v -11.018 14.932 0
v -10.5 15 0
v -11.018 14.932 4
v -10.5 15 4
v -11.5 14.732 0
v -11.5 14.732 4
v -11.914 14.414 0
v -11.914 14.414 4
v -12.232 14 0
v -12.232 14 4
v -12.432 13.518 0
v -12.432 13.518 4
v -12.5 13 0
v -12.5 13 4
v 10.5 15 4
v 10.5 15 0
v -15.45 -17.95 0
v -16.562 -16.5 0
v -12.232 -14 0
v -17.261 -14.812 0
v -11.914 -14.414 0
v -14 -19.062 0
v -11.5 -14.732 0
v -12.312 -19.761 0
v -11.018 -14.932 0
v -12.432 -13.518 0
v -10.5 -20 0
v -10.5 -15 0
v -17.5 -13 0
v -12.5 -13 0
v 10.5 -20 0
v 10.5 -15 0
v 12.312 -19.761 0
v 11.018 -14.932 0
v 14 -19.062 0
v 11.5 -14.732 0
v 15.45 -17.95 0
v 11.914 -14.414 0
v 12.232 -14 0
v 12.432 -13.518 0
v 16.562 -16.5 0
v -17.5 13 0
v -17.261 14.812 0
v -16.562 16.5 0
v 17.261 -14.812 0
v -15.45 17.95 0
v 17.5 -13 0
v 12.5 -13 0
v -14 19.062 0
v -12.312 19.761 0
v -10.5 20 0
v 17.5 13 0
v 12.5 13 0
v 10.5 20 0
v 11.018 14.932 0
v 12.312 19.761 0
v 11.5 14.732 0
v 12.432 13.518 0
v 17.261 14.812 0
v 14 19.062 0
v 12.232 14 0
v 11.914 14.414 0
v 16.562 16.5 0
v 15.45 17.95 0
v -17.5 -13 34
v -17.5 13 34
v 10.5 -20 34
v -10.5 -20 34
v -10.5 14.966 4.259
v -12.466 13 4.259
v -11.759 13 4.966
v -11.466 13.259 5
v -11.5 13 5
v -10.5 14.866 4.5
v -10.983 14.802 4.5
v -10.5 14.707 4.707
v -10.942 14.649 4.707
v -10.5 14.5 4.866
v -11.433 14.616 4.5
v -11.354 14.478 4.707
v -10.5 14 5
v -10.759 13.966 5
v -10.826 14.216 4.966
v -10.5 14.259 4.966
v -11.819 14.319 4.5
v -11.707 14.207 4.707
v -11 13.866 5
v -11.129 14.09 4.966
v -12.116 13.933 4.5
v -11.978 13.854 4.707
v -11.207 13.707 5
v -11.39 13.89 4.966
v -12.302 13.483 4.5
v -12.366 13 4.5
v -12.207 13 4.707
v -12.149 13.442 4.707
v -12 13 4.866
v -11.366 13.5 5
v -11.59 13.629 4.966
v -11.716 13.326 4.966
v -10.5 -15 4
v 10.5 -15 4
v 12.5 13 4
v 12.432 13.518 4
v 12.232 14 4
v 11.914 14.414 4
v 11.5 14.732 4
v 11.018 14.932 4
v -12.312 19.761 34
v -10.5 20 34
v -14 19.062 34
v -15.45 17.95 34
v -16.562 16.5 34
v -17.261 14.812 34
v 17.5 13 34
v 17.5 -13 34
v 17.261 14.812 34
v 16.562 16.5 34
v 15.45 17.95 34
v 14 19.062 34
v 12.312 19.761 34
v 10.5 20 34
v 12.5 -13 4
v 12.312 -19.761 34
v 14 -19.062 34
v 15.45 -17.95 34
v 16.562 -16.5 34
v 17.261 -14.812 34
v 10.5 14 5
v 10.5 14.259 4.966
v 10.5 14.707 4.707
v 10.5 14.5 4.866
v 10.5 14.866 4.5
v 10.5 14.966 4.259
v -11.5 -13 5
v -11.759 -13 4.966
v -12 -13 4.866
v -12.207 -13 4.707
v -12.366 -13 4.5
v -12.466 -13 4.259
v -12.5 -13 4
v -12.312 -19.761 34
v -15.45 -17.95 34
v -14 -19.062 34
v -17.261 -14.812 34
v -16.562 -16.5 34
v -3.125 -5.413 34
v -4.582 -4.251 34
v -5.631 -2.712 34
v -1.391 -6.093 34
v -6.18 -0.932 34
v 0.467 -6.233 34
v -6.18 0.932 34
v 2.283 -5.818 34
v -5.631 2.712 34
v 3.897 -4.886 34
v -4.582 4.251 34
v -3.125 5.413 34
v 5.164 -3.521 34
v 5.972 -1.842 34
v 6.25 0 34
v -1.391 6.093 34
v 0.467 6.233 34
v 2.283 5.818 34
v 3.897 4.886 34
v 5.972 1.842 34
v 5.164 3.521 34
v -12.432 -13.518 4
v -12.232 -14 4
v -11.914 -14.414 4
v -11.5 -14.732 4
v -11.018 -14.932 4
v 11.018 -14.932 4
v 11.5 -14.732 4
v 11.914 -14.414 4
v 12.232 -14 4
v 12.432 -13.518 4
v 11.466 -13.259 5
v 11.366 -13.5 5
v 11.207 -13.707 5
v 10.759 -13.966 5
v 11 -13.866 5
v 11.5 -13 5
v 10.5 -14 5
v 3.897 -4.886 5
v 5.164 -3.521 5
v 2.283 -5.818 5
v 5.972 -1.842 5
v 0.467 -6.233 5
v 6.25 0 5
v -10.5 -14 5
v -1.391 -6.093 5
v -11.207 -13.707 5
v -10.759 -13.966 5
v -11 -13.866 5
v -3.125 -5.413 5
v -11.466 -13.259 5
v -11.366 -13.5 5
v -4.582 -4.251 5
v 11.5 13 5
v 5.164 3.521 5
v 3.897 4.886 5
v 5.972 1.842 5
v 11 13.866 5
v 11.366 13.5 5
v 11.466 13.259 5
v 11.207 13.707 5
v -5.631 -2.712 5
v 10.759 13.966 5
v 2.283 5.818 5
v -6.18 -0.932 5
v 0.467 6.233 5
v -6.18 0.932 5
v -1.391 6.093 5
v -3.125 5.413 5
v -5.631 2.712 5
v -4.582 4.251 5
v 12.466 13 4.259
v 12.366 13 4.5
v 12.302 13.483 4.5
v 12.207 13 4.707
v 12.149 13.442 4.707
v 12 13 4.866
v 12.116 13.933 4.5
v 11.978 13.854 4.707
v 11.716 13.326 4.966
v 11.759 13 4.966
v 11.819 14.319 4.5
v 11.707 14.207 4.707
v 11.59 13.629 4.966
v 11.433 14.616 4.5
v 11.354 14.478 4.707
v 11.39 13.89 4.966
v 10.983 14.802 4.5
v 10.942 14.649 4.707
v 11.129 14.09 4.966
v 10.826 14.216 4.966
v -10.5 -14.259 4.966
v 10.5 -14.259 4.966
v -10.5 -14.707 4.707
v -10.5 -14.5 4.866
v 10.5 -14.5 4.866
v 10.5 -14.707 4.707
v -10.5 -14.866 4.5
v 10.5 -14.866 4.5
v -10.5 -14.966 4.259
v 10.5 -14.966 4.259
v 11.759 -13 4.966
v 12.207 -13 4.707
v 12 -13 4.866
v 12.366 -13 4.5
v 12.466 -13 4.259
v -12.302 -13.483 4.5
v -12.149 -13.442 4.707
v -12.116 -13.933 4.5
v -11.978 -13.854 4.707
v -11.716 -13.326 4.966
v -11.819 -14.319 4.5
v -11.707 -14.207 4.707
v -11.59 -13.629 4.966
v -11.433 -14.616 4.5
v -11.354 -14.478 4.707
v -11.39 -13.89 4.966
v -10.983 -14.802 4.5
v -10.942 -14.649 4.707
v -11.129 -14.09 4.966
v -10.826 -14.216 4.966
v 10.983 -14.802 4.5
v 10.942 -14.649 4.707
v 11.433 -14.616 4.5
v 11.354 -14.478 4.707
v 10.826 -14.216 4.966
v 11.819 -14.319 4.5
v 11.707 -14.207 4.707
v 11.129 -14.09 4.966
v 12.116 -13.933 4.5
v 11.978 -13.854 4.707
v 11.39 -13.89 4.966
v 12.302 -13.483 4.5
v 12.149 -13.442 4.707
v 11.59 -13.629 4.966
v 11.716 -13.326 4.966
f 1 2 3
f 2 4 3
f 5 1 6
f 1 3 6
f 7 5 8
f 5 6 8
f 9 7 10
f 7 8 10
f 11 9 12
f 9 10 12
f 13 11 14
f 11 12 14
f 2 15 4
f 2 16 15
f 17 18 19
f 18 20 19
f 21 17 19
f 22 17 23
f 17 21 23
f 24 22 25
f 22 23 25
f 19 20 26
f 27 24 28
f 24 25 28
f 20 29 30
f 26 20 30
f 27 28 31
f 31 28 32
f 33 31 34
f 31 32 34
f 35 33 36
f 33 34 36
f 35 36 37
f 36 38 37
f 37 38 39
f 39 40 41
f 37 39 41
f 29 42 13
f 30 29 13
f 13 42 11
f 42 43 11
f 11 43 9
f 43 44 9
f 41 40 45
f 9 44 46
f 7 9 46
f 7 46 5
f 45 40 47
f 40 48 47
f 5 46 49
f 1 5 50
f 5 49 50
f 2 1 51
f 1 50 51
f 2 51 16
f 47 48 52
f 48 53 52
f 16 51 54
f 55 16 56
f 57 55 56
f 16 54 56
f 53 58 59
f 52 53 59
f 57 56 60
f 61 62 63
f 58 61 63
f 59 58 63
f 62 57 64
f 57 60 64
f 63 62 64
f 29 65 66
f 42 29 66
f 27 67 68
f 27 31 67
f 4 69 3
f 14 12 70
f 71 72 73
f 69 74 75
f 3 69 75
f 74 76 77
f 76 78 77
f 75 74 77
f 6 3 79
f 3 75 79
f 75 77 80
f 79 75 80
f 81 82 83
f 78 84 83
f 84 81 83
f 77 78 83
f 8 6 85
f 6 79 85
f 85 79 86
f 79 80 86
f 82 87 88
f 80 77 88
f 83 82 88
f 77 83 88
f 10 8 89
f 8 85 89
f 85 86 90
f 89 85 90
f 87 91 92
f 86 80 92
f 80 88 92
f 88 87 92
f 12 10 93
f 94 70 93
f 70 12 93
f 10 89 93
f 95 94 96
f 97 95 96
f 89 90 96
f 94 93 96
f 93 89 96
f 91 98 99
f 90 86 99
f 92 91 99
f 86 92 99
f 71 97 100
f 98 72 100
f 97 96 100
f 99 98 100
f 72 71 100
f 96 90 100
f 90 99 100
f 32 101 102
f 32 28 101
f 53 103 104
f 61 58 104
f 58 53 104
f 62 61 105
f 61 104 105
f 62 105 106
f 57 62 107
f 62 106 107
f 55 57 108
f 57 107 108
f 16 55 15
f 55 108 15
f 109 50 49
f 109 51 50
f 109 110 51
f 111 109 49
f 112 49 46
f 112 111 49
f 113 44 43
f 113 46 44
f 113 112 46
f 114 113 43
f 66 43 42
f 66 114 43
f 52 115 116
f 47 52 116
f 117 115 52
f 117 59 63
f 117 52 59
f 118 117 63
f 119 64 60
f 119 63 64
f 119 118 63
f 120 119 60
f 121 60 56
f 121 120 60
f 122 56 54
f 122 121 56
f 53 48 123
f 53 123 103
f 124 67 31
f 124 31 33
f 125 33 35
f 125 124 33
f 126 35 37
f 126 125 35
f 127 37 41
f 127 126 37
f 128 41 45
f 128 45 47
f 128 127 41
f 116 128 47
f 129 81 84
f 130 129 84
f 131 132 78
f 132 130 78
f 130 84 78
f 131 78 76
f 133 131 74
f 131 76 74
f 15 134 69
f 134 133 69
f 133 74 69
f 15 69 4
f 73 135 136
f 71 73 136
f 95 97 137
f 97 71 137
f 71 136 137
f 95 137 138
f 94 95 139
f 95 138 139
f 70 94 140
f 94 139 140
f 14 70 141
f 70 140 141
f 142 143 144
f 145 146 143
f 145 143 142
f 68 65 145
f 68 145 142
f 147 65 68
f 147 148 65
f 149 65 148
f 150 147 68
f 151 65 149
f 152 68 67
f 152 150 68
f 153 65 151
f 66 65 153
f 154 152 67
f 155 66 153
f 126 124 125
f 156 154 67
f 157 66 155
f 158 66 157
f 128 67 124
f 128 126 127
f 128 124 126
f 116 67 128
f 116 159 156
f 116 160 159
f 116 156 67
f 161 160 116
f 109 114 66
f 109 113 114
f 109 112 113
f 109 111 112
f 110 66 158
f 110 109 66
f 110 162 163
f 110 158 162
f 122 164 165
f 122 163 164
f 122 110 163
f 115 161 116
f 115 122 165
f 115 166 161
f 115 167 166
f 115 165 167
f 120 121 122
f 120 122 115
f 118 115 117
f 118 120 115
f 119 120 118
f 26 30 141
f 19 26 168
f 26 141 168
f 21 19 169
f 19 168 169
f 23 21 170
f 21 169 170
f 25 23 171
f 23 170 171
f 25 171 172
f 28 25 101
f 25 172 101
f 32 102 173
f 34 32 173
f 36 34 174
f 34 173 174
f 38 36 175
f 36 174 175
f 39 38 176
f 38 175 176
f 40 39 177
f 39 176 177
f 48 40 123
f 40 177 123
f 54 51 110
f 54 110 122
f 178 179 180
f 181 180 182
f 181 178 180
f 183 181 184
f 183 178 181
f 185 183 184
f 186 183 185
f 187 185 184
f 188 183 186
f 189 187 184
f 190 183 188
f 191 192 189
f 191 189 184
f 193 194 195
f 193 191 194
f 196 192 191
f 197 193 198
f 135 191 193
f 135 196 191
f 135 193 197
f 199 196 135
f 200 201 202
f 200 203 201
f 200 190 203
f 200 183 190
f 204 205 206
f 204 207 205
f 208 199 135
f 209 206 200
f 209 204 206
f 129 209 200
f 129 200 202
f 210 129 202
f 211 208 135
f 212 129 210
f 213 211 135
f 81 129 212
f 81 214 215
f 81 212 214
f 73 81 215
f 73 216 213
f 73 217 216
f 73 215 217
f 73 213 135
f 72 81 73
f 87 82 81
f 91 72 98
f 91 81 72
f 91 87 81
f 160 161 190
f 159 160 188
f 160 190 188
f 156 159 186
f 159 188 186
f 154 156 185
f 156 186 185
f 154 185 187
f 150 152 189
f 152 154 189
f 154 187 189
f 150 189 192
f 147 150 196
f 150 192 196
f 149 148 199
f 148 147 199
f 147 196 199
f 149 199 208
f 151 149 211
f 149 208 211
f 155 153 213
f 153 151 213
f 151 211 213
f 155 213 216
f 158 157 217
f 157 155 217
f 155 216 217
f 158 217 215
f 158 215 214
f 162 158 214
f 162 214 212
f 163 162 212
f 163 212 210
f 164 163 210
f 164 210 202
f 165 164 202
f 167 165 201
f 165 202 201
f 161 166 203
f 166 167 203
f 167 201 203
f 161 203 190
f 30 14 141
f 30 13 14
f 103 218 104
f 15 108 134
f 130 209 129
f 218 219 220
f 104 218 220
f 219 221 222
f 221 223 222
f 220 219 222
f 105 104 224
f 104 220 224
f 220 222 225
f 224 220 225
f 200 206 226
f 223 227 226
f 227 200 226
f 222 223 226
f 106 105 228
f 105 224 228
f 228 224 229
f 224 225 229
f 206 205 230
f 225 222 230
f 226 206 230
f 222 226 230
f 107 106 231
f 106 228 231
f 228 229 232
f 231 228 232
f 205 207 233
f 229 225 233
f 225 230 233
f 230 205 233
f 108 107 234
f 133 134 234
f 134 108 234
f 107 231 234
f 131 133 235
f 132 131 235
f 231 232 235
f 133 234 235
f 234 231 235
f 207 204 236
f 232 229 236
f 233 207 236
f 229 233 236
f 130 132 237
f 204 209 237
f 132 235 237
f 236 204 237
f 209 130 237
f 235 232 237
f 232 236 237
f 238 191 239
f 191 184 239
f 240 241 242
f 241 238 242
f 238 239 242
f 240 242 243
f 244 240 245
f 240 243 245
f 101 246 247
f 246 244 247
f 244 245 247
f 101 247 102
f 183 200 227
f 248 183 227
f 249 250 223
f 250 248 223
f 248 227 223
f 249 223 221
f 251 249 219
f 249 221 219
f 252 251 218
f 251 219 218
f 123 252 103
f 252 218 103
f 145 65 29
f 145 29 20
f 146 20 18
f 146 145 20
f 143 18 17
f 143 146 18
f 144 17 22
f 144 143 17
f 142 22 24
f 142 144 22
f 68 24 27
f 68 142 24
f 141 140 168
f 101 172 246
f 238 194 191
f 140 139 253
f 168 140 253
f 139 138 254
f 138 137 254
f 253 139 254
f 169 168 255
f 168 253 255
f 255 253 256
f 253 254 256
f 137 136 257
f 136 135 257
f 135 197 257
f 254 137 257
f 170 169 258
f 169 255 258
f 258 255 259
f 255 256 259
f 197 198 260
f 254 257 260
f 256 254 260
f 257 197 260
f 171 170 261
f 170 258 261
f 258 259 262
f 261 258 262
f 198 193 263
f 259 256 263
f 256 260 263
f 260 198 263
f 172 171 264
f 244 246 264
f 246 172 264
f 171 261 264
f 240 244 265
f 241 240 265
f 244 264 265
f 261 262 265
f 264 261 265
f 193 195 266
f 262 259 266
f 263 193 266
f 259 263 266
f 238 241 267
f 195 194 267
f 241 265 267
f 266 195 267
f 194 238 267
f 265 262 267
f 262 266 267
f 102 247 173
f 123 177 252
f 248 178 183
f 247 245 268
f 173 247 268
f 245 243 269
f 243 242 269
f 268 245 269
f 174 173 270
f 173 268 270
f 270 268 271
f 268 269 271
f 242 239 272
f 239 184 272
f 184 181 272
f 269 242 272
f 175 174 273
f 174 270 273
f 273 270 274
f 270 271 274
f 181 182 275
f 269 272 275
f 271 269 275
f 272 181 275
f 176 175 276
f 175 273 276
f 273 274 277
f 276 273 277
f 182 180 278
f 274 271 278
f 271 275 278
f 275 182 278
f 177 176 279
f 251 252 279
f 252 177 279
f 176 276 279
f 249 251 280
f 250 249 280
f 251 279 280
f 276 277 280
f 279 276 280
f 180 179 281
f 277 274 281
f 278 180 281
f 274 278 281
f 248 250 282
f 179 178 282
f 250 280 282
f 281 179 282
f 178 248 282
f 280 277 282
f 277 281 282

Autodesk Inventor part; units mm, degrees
ref_plane "YZ Plane" through (0, 0, 0) normal (1, 0, 0) x (0, 1, 0)
ref_plane "XZ Plane" through (0, 0, 0) normal (0, 1, 0) x (-1, 0, 0)
ref_plane "XY Plane" through (0, 0, 0) normal (0, 0, 1) x (1, 0, 0)
sketch "Эскиз1" plane through (0, 0, 0) normal (0, 0, 1) x (1, 0, 0)
  line L0 (17.5, -20) -> (-17.5, -20)
  line L1 (-17.5, -20) -> (-17.5, 20)
  line L2 (-17.5, 20) -> (17.5, 20)
  line L3 (17.5, 20) -> (17.5, -20)
  line L4 (17.5, -20) -> (-17.5, 20) construction
  line L5 (-17.5, -20) -> (17.5, 20) construction
  circle A0 centre (0, 0) radius 6.25
  dimension "d0" = 40
  dimension "d1" = 12.5
  dimension "d11" = 35
extrude "Выдавливание1" add sketch "Эскиз1" along normal blind 34
fillet "Сопряжение1" radius 7 4 edges at (-17.5, -20, 17) (-17.5, 20, 17) (17.5, 20, 17) (17.5, -20, 17)
sketch "Эскиз2" plane through (0, 0, 0) normal (0, 0, -1) x (-1, 0, 0)
  line L0 (-10.5, -20) -> (10.5, -20) projected
  line L1 (10.5, 20) -> (-10.5, 20) projected
  line L2 (-17.5, 13) -> (-17.5, -13) projected
  arc A0 (-17.5, -13) -> (-10.5, -20) centre (-10.5, -13) ccw projected
  arc A1 (10.5, -20) -> (17.5, -13) centre (10.5, -13) ccw projected
  arc A2 (17.5, 13) -> (10.5, 20) centre (10.5, 13) ccw projected
  arc A3 (-10.5, 20) -> (-17.5, 13) centre (-10.5, 13) ccw projected
  line L3 (17.5, -13) -> (17.5, 13) projected
  line L4 (-12.5, 15) -> (12.5, 15)
  line L5 (12.5, 15) -> (12.5, -15)
  line L6 (12.5, -15) -> (-12.5, -15)
  line L7 (-12.5, -15) -> (-12.5, 15)
  line L8 (-12.5, 15) -> (12.5, -15) construction
  line L9 (12.5, 15) -> (-12.5, -15) construction
  point P0 (0, 0)
  dimension "d12" = 5
  dimension "d13" = 5
extrude "Выдавливание2" cut sketch "Эскиз2" against normal blind 5 contours L4 L5 L6 L7
fillet "Сопряжение3" radius 2 4 edges at (12.5, -15, 2.5) (-12.5, -15, 2.5) (-12.5, 15, 2.5) (12.5, 15, 2.5)
fillet "Сопряжение4" radius 1 8 edges at (-11.9142, 14.4142, 5) (-12.5, 0, 5) (-11.9142, -14.4142, 5) (0, -15, 5) (11.9142, -14.4142, 5) (12.5, 0, 5) (11.9142, 14.4142, 5) (0, 15, 5)
properties part number "платик под двигатель"
